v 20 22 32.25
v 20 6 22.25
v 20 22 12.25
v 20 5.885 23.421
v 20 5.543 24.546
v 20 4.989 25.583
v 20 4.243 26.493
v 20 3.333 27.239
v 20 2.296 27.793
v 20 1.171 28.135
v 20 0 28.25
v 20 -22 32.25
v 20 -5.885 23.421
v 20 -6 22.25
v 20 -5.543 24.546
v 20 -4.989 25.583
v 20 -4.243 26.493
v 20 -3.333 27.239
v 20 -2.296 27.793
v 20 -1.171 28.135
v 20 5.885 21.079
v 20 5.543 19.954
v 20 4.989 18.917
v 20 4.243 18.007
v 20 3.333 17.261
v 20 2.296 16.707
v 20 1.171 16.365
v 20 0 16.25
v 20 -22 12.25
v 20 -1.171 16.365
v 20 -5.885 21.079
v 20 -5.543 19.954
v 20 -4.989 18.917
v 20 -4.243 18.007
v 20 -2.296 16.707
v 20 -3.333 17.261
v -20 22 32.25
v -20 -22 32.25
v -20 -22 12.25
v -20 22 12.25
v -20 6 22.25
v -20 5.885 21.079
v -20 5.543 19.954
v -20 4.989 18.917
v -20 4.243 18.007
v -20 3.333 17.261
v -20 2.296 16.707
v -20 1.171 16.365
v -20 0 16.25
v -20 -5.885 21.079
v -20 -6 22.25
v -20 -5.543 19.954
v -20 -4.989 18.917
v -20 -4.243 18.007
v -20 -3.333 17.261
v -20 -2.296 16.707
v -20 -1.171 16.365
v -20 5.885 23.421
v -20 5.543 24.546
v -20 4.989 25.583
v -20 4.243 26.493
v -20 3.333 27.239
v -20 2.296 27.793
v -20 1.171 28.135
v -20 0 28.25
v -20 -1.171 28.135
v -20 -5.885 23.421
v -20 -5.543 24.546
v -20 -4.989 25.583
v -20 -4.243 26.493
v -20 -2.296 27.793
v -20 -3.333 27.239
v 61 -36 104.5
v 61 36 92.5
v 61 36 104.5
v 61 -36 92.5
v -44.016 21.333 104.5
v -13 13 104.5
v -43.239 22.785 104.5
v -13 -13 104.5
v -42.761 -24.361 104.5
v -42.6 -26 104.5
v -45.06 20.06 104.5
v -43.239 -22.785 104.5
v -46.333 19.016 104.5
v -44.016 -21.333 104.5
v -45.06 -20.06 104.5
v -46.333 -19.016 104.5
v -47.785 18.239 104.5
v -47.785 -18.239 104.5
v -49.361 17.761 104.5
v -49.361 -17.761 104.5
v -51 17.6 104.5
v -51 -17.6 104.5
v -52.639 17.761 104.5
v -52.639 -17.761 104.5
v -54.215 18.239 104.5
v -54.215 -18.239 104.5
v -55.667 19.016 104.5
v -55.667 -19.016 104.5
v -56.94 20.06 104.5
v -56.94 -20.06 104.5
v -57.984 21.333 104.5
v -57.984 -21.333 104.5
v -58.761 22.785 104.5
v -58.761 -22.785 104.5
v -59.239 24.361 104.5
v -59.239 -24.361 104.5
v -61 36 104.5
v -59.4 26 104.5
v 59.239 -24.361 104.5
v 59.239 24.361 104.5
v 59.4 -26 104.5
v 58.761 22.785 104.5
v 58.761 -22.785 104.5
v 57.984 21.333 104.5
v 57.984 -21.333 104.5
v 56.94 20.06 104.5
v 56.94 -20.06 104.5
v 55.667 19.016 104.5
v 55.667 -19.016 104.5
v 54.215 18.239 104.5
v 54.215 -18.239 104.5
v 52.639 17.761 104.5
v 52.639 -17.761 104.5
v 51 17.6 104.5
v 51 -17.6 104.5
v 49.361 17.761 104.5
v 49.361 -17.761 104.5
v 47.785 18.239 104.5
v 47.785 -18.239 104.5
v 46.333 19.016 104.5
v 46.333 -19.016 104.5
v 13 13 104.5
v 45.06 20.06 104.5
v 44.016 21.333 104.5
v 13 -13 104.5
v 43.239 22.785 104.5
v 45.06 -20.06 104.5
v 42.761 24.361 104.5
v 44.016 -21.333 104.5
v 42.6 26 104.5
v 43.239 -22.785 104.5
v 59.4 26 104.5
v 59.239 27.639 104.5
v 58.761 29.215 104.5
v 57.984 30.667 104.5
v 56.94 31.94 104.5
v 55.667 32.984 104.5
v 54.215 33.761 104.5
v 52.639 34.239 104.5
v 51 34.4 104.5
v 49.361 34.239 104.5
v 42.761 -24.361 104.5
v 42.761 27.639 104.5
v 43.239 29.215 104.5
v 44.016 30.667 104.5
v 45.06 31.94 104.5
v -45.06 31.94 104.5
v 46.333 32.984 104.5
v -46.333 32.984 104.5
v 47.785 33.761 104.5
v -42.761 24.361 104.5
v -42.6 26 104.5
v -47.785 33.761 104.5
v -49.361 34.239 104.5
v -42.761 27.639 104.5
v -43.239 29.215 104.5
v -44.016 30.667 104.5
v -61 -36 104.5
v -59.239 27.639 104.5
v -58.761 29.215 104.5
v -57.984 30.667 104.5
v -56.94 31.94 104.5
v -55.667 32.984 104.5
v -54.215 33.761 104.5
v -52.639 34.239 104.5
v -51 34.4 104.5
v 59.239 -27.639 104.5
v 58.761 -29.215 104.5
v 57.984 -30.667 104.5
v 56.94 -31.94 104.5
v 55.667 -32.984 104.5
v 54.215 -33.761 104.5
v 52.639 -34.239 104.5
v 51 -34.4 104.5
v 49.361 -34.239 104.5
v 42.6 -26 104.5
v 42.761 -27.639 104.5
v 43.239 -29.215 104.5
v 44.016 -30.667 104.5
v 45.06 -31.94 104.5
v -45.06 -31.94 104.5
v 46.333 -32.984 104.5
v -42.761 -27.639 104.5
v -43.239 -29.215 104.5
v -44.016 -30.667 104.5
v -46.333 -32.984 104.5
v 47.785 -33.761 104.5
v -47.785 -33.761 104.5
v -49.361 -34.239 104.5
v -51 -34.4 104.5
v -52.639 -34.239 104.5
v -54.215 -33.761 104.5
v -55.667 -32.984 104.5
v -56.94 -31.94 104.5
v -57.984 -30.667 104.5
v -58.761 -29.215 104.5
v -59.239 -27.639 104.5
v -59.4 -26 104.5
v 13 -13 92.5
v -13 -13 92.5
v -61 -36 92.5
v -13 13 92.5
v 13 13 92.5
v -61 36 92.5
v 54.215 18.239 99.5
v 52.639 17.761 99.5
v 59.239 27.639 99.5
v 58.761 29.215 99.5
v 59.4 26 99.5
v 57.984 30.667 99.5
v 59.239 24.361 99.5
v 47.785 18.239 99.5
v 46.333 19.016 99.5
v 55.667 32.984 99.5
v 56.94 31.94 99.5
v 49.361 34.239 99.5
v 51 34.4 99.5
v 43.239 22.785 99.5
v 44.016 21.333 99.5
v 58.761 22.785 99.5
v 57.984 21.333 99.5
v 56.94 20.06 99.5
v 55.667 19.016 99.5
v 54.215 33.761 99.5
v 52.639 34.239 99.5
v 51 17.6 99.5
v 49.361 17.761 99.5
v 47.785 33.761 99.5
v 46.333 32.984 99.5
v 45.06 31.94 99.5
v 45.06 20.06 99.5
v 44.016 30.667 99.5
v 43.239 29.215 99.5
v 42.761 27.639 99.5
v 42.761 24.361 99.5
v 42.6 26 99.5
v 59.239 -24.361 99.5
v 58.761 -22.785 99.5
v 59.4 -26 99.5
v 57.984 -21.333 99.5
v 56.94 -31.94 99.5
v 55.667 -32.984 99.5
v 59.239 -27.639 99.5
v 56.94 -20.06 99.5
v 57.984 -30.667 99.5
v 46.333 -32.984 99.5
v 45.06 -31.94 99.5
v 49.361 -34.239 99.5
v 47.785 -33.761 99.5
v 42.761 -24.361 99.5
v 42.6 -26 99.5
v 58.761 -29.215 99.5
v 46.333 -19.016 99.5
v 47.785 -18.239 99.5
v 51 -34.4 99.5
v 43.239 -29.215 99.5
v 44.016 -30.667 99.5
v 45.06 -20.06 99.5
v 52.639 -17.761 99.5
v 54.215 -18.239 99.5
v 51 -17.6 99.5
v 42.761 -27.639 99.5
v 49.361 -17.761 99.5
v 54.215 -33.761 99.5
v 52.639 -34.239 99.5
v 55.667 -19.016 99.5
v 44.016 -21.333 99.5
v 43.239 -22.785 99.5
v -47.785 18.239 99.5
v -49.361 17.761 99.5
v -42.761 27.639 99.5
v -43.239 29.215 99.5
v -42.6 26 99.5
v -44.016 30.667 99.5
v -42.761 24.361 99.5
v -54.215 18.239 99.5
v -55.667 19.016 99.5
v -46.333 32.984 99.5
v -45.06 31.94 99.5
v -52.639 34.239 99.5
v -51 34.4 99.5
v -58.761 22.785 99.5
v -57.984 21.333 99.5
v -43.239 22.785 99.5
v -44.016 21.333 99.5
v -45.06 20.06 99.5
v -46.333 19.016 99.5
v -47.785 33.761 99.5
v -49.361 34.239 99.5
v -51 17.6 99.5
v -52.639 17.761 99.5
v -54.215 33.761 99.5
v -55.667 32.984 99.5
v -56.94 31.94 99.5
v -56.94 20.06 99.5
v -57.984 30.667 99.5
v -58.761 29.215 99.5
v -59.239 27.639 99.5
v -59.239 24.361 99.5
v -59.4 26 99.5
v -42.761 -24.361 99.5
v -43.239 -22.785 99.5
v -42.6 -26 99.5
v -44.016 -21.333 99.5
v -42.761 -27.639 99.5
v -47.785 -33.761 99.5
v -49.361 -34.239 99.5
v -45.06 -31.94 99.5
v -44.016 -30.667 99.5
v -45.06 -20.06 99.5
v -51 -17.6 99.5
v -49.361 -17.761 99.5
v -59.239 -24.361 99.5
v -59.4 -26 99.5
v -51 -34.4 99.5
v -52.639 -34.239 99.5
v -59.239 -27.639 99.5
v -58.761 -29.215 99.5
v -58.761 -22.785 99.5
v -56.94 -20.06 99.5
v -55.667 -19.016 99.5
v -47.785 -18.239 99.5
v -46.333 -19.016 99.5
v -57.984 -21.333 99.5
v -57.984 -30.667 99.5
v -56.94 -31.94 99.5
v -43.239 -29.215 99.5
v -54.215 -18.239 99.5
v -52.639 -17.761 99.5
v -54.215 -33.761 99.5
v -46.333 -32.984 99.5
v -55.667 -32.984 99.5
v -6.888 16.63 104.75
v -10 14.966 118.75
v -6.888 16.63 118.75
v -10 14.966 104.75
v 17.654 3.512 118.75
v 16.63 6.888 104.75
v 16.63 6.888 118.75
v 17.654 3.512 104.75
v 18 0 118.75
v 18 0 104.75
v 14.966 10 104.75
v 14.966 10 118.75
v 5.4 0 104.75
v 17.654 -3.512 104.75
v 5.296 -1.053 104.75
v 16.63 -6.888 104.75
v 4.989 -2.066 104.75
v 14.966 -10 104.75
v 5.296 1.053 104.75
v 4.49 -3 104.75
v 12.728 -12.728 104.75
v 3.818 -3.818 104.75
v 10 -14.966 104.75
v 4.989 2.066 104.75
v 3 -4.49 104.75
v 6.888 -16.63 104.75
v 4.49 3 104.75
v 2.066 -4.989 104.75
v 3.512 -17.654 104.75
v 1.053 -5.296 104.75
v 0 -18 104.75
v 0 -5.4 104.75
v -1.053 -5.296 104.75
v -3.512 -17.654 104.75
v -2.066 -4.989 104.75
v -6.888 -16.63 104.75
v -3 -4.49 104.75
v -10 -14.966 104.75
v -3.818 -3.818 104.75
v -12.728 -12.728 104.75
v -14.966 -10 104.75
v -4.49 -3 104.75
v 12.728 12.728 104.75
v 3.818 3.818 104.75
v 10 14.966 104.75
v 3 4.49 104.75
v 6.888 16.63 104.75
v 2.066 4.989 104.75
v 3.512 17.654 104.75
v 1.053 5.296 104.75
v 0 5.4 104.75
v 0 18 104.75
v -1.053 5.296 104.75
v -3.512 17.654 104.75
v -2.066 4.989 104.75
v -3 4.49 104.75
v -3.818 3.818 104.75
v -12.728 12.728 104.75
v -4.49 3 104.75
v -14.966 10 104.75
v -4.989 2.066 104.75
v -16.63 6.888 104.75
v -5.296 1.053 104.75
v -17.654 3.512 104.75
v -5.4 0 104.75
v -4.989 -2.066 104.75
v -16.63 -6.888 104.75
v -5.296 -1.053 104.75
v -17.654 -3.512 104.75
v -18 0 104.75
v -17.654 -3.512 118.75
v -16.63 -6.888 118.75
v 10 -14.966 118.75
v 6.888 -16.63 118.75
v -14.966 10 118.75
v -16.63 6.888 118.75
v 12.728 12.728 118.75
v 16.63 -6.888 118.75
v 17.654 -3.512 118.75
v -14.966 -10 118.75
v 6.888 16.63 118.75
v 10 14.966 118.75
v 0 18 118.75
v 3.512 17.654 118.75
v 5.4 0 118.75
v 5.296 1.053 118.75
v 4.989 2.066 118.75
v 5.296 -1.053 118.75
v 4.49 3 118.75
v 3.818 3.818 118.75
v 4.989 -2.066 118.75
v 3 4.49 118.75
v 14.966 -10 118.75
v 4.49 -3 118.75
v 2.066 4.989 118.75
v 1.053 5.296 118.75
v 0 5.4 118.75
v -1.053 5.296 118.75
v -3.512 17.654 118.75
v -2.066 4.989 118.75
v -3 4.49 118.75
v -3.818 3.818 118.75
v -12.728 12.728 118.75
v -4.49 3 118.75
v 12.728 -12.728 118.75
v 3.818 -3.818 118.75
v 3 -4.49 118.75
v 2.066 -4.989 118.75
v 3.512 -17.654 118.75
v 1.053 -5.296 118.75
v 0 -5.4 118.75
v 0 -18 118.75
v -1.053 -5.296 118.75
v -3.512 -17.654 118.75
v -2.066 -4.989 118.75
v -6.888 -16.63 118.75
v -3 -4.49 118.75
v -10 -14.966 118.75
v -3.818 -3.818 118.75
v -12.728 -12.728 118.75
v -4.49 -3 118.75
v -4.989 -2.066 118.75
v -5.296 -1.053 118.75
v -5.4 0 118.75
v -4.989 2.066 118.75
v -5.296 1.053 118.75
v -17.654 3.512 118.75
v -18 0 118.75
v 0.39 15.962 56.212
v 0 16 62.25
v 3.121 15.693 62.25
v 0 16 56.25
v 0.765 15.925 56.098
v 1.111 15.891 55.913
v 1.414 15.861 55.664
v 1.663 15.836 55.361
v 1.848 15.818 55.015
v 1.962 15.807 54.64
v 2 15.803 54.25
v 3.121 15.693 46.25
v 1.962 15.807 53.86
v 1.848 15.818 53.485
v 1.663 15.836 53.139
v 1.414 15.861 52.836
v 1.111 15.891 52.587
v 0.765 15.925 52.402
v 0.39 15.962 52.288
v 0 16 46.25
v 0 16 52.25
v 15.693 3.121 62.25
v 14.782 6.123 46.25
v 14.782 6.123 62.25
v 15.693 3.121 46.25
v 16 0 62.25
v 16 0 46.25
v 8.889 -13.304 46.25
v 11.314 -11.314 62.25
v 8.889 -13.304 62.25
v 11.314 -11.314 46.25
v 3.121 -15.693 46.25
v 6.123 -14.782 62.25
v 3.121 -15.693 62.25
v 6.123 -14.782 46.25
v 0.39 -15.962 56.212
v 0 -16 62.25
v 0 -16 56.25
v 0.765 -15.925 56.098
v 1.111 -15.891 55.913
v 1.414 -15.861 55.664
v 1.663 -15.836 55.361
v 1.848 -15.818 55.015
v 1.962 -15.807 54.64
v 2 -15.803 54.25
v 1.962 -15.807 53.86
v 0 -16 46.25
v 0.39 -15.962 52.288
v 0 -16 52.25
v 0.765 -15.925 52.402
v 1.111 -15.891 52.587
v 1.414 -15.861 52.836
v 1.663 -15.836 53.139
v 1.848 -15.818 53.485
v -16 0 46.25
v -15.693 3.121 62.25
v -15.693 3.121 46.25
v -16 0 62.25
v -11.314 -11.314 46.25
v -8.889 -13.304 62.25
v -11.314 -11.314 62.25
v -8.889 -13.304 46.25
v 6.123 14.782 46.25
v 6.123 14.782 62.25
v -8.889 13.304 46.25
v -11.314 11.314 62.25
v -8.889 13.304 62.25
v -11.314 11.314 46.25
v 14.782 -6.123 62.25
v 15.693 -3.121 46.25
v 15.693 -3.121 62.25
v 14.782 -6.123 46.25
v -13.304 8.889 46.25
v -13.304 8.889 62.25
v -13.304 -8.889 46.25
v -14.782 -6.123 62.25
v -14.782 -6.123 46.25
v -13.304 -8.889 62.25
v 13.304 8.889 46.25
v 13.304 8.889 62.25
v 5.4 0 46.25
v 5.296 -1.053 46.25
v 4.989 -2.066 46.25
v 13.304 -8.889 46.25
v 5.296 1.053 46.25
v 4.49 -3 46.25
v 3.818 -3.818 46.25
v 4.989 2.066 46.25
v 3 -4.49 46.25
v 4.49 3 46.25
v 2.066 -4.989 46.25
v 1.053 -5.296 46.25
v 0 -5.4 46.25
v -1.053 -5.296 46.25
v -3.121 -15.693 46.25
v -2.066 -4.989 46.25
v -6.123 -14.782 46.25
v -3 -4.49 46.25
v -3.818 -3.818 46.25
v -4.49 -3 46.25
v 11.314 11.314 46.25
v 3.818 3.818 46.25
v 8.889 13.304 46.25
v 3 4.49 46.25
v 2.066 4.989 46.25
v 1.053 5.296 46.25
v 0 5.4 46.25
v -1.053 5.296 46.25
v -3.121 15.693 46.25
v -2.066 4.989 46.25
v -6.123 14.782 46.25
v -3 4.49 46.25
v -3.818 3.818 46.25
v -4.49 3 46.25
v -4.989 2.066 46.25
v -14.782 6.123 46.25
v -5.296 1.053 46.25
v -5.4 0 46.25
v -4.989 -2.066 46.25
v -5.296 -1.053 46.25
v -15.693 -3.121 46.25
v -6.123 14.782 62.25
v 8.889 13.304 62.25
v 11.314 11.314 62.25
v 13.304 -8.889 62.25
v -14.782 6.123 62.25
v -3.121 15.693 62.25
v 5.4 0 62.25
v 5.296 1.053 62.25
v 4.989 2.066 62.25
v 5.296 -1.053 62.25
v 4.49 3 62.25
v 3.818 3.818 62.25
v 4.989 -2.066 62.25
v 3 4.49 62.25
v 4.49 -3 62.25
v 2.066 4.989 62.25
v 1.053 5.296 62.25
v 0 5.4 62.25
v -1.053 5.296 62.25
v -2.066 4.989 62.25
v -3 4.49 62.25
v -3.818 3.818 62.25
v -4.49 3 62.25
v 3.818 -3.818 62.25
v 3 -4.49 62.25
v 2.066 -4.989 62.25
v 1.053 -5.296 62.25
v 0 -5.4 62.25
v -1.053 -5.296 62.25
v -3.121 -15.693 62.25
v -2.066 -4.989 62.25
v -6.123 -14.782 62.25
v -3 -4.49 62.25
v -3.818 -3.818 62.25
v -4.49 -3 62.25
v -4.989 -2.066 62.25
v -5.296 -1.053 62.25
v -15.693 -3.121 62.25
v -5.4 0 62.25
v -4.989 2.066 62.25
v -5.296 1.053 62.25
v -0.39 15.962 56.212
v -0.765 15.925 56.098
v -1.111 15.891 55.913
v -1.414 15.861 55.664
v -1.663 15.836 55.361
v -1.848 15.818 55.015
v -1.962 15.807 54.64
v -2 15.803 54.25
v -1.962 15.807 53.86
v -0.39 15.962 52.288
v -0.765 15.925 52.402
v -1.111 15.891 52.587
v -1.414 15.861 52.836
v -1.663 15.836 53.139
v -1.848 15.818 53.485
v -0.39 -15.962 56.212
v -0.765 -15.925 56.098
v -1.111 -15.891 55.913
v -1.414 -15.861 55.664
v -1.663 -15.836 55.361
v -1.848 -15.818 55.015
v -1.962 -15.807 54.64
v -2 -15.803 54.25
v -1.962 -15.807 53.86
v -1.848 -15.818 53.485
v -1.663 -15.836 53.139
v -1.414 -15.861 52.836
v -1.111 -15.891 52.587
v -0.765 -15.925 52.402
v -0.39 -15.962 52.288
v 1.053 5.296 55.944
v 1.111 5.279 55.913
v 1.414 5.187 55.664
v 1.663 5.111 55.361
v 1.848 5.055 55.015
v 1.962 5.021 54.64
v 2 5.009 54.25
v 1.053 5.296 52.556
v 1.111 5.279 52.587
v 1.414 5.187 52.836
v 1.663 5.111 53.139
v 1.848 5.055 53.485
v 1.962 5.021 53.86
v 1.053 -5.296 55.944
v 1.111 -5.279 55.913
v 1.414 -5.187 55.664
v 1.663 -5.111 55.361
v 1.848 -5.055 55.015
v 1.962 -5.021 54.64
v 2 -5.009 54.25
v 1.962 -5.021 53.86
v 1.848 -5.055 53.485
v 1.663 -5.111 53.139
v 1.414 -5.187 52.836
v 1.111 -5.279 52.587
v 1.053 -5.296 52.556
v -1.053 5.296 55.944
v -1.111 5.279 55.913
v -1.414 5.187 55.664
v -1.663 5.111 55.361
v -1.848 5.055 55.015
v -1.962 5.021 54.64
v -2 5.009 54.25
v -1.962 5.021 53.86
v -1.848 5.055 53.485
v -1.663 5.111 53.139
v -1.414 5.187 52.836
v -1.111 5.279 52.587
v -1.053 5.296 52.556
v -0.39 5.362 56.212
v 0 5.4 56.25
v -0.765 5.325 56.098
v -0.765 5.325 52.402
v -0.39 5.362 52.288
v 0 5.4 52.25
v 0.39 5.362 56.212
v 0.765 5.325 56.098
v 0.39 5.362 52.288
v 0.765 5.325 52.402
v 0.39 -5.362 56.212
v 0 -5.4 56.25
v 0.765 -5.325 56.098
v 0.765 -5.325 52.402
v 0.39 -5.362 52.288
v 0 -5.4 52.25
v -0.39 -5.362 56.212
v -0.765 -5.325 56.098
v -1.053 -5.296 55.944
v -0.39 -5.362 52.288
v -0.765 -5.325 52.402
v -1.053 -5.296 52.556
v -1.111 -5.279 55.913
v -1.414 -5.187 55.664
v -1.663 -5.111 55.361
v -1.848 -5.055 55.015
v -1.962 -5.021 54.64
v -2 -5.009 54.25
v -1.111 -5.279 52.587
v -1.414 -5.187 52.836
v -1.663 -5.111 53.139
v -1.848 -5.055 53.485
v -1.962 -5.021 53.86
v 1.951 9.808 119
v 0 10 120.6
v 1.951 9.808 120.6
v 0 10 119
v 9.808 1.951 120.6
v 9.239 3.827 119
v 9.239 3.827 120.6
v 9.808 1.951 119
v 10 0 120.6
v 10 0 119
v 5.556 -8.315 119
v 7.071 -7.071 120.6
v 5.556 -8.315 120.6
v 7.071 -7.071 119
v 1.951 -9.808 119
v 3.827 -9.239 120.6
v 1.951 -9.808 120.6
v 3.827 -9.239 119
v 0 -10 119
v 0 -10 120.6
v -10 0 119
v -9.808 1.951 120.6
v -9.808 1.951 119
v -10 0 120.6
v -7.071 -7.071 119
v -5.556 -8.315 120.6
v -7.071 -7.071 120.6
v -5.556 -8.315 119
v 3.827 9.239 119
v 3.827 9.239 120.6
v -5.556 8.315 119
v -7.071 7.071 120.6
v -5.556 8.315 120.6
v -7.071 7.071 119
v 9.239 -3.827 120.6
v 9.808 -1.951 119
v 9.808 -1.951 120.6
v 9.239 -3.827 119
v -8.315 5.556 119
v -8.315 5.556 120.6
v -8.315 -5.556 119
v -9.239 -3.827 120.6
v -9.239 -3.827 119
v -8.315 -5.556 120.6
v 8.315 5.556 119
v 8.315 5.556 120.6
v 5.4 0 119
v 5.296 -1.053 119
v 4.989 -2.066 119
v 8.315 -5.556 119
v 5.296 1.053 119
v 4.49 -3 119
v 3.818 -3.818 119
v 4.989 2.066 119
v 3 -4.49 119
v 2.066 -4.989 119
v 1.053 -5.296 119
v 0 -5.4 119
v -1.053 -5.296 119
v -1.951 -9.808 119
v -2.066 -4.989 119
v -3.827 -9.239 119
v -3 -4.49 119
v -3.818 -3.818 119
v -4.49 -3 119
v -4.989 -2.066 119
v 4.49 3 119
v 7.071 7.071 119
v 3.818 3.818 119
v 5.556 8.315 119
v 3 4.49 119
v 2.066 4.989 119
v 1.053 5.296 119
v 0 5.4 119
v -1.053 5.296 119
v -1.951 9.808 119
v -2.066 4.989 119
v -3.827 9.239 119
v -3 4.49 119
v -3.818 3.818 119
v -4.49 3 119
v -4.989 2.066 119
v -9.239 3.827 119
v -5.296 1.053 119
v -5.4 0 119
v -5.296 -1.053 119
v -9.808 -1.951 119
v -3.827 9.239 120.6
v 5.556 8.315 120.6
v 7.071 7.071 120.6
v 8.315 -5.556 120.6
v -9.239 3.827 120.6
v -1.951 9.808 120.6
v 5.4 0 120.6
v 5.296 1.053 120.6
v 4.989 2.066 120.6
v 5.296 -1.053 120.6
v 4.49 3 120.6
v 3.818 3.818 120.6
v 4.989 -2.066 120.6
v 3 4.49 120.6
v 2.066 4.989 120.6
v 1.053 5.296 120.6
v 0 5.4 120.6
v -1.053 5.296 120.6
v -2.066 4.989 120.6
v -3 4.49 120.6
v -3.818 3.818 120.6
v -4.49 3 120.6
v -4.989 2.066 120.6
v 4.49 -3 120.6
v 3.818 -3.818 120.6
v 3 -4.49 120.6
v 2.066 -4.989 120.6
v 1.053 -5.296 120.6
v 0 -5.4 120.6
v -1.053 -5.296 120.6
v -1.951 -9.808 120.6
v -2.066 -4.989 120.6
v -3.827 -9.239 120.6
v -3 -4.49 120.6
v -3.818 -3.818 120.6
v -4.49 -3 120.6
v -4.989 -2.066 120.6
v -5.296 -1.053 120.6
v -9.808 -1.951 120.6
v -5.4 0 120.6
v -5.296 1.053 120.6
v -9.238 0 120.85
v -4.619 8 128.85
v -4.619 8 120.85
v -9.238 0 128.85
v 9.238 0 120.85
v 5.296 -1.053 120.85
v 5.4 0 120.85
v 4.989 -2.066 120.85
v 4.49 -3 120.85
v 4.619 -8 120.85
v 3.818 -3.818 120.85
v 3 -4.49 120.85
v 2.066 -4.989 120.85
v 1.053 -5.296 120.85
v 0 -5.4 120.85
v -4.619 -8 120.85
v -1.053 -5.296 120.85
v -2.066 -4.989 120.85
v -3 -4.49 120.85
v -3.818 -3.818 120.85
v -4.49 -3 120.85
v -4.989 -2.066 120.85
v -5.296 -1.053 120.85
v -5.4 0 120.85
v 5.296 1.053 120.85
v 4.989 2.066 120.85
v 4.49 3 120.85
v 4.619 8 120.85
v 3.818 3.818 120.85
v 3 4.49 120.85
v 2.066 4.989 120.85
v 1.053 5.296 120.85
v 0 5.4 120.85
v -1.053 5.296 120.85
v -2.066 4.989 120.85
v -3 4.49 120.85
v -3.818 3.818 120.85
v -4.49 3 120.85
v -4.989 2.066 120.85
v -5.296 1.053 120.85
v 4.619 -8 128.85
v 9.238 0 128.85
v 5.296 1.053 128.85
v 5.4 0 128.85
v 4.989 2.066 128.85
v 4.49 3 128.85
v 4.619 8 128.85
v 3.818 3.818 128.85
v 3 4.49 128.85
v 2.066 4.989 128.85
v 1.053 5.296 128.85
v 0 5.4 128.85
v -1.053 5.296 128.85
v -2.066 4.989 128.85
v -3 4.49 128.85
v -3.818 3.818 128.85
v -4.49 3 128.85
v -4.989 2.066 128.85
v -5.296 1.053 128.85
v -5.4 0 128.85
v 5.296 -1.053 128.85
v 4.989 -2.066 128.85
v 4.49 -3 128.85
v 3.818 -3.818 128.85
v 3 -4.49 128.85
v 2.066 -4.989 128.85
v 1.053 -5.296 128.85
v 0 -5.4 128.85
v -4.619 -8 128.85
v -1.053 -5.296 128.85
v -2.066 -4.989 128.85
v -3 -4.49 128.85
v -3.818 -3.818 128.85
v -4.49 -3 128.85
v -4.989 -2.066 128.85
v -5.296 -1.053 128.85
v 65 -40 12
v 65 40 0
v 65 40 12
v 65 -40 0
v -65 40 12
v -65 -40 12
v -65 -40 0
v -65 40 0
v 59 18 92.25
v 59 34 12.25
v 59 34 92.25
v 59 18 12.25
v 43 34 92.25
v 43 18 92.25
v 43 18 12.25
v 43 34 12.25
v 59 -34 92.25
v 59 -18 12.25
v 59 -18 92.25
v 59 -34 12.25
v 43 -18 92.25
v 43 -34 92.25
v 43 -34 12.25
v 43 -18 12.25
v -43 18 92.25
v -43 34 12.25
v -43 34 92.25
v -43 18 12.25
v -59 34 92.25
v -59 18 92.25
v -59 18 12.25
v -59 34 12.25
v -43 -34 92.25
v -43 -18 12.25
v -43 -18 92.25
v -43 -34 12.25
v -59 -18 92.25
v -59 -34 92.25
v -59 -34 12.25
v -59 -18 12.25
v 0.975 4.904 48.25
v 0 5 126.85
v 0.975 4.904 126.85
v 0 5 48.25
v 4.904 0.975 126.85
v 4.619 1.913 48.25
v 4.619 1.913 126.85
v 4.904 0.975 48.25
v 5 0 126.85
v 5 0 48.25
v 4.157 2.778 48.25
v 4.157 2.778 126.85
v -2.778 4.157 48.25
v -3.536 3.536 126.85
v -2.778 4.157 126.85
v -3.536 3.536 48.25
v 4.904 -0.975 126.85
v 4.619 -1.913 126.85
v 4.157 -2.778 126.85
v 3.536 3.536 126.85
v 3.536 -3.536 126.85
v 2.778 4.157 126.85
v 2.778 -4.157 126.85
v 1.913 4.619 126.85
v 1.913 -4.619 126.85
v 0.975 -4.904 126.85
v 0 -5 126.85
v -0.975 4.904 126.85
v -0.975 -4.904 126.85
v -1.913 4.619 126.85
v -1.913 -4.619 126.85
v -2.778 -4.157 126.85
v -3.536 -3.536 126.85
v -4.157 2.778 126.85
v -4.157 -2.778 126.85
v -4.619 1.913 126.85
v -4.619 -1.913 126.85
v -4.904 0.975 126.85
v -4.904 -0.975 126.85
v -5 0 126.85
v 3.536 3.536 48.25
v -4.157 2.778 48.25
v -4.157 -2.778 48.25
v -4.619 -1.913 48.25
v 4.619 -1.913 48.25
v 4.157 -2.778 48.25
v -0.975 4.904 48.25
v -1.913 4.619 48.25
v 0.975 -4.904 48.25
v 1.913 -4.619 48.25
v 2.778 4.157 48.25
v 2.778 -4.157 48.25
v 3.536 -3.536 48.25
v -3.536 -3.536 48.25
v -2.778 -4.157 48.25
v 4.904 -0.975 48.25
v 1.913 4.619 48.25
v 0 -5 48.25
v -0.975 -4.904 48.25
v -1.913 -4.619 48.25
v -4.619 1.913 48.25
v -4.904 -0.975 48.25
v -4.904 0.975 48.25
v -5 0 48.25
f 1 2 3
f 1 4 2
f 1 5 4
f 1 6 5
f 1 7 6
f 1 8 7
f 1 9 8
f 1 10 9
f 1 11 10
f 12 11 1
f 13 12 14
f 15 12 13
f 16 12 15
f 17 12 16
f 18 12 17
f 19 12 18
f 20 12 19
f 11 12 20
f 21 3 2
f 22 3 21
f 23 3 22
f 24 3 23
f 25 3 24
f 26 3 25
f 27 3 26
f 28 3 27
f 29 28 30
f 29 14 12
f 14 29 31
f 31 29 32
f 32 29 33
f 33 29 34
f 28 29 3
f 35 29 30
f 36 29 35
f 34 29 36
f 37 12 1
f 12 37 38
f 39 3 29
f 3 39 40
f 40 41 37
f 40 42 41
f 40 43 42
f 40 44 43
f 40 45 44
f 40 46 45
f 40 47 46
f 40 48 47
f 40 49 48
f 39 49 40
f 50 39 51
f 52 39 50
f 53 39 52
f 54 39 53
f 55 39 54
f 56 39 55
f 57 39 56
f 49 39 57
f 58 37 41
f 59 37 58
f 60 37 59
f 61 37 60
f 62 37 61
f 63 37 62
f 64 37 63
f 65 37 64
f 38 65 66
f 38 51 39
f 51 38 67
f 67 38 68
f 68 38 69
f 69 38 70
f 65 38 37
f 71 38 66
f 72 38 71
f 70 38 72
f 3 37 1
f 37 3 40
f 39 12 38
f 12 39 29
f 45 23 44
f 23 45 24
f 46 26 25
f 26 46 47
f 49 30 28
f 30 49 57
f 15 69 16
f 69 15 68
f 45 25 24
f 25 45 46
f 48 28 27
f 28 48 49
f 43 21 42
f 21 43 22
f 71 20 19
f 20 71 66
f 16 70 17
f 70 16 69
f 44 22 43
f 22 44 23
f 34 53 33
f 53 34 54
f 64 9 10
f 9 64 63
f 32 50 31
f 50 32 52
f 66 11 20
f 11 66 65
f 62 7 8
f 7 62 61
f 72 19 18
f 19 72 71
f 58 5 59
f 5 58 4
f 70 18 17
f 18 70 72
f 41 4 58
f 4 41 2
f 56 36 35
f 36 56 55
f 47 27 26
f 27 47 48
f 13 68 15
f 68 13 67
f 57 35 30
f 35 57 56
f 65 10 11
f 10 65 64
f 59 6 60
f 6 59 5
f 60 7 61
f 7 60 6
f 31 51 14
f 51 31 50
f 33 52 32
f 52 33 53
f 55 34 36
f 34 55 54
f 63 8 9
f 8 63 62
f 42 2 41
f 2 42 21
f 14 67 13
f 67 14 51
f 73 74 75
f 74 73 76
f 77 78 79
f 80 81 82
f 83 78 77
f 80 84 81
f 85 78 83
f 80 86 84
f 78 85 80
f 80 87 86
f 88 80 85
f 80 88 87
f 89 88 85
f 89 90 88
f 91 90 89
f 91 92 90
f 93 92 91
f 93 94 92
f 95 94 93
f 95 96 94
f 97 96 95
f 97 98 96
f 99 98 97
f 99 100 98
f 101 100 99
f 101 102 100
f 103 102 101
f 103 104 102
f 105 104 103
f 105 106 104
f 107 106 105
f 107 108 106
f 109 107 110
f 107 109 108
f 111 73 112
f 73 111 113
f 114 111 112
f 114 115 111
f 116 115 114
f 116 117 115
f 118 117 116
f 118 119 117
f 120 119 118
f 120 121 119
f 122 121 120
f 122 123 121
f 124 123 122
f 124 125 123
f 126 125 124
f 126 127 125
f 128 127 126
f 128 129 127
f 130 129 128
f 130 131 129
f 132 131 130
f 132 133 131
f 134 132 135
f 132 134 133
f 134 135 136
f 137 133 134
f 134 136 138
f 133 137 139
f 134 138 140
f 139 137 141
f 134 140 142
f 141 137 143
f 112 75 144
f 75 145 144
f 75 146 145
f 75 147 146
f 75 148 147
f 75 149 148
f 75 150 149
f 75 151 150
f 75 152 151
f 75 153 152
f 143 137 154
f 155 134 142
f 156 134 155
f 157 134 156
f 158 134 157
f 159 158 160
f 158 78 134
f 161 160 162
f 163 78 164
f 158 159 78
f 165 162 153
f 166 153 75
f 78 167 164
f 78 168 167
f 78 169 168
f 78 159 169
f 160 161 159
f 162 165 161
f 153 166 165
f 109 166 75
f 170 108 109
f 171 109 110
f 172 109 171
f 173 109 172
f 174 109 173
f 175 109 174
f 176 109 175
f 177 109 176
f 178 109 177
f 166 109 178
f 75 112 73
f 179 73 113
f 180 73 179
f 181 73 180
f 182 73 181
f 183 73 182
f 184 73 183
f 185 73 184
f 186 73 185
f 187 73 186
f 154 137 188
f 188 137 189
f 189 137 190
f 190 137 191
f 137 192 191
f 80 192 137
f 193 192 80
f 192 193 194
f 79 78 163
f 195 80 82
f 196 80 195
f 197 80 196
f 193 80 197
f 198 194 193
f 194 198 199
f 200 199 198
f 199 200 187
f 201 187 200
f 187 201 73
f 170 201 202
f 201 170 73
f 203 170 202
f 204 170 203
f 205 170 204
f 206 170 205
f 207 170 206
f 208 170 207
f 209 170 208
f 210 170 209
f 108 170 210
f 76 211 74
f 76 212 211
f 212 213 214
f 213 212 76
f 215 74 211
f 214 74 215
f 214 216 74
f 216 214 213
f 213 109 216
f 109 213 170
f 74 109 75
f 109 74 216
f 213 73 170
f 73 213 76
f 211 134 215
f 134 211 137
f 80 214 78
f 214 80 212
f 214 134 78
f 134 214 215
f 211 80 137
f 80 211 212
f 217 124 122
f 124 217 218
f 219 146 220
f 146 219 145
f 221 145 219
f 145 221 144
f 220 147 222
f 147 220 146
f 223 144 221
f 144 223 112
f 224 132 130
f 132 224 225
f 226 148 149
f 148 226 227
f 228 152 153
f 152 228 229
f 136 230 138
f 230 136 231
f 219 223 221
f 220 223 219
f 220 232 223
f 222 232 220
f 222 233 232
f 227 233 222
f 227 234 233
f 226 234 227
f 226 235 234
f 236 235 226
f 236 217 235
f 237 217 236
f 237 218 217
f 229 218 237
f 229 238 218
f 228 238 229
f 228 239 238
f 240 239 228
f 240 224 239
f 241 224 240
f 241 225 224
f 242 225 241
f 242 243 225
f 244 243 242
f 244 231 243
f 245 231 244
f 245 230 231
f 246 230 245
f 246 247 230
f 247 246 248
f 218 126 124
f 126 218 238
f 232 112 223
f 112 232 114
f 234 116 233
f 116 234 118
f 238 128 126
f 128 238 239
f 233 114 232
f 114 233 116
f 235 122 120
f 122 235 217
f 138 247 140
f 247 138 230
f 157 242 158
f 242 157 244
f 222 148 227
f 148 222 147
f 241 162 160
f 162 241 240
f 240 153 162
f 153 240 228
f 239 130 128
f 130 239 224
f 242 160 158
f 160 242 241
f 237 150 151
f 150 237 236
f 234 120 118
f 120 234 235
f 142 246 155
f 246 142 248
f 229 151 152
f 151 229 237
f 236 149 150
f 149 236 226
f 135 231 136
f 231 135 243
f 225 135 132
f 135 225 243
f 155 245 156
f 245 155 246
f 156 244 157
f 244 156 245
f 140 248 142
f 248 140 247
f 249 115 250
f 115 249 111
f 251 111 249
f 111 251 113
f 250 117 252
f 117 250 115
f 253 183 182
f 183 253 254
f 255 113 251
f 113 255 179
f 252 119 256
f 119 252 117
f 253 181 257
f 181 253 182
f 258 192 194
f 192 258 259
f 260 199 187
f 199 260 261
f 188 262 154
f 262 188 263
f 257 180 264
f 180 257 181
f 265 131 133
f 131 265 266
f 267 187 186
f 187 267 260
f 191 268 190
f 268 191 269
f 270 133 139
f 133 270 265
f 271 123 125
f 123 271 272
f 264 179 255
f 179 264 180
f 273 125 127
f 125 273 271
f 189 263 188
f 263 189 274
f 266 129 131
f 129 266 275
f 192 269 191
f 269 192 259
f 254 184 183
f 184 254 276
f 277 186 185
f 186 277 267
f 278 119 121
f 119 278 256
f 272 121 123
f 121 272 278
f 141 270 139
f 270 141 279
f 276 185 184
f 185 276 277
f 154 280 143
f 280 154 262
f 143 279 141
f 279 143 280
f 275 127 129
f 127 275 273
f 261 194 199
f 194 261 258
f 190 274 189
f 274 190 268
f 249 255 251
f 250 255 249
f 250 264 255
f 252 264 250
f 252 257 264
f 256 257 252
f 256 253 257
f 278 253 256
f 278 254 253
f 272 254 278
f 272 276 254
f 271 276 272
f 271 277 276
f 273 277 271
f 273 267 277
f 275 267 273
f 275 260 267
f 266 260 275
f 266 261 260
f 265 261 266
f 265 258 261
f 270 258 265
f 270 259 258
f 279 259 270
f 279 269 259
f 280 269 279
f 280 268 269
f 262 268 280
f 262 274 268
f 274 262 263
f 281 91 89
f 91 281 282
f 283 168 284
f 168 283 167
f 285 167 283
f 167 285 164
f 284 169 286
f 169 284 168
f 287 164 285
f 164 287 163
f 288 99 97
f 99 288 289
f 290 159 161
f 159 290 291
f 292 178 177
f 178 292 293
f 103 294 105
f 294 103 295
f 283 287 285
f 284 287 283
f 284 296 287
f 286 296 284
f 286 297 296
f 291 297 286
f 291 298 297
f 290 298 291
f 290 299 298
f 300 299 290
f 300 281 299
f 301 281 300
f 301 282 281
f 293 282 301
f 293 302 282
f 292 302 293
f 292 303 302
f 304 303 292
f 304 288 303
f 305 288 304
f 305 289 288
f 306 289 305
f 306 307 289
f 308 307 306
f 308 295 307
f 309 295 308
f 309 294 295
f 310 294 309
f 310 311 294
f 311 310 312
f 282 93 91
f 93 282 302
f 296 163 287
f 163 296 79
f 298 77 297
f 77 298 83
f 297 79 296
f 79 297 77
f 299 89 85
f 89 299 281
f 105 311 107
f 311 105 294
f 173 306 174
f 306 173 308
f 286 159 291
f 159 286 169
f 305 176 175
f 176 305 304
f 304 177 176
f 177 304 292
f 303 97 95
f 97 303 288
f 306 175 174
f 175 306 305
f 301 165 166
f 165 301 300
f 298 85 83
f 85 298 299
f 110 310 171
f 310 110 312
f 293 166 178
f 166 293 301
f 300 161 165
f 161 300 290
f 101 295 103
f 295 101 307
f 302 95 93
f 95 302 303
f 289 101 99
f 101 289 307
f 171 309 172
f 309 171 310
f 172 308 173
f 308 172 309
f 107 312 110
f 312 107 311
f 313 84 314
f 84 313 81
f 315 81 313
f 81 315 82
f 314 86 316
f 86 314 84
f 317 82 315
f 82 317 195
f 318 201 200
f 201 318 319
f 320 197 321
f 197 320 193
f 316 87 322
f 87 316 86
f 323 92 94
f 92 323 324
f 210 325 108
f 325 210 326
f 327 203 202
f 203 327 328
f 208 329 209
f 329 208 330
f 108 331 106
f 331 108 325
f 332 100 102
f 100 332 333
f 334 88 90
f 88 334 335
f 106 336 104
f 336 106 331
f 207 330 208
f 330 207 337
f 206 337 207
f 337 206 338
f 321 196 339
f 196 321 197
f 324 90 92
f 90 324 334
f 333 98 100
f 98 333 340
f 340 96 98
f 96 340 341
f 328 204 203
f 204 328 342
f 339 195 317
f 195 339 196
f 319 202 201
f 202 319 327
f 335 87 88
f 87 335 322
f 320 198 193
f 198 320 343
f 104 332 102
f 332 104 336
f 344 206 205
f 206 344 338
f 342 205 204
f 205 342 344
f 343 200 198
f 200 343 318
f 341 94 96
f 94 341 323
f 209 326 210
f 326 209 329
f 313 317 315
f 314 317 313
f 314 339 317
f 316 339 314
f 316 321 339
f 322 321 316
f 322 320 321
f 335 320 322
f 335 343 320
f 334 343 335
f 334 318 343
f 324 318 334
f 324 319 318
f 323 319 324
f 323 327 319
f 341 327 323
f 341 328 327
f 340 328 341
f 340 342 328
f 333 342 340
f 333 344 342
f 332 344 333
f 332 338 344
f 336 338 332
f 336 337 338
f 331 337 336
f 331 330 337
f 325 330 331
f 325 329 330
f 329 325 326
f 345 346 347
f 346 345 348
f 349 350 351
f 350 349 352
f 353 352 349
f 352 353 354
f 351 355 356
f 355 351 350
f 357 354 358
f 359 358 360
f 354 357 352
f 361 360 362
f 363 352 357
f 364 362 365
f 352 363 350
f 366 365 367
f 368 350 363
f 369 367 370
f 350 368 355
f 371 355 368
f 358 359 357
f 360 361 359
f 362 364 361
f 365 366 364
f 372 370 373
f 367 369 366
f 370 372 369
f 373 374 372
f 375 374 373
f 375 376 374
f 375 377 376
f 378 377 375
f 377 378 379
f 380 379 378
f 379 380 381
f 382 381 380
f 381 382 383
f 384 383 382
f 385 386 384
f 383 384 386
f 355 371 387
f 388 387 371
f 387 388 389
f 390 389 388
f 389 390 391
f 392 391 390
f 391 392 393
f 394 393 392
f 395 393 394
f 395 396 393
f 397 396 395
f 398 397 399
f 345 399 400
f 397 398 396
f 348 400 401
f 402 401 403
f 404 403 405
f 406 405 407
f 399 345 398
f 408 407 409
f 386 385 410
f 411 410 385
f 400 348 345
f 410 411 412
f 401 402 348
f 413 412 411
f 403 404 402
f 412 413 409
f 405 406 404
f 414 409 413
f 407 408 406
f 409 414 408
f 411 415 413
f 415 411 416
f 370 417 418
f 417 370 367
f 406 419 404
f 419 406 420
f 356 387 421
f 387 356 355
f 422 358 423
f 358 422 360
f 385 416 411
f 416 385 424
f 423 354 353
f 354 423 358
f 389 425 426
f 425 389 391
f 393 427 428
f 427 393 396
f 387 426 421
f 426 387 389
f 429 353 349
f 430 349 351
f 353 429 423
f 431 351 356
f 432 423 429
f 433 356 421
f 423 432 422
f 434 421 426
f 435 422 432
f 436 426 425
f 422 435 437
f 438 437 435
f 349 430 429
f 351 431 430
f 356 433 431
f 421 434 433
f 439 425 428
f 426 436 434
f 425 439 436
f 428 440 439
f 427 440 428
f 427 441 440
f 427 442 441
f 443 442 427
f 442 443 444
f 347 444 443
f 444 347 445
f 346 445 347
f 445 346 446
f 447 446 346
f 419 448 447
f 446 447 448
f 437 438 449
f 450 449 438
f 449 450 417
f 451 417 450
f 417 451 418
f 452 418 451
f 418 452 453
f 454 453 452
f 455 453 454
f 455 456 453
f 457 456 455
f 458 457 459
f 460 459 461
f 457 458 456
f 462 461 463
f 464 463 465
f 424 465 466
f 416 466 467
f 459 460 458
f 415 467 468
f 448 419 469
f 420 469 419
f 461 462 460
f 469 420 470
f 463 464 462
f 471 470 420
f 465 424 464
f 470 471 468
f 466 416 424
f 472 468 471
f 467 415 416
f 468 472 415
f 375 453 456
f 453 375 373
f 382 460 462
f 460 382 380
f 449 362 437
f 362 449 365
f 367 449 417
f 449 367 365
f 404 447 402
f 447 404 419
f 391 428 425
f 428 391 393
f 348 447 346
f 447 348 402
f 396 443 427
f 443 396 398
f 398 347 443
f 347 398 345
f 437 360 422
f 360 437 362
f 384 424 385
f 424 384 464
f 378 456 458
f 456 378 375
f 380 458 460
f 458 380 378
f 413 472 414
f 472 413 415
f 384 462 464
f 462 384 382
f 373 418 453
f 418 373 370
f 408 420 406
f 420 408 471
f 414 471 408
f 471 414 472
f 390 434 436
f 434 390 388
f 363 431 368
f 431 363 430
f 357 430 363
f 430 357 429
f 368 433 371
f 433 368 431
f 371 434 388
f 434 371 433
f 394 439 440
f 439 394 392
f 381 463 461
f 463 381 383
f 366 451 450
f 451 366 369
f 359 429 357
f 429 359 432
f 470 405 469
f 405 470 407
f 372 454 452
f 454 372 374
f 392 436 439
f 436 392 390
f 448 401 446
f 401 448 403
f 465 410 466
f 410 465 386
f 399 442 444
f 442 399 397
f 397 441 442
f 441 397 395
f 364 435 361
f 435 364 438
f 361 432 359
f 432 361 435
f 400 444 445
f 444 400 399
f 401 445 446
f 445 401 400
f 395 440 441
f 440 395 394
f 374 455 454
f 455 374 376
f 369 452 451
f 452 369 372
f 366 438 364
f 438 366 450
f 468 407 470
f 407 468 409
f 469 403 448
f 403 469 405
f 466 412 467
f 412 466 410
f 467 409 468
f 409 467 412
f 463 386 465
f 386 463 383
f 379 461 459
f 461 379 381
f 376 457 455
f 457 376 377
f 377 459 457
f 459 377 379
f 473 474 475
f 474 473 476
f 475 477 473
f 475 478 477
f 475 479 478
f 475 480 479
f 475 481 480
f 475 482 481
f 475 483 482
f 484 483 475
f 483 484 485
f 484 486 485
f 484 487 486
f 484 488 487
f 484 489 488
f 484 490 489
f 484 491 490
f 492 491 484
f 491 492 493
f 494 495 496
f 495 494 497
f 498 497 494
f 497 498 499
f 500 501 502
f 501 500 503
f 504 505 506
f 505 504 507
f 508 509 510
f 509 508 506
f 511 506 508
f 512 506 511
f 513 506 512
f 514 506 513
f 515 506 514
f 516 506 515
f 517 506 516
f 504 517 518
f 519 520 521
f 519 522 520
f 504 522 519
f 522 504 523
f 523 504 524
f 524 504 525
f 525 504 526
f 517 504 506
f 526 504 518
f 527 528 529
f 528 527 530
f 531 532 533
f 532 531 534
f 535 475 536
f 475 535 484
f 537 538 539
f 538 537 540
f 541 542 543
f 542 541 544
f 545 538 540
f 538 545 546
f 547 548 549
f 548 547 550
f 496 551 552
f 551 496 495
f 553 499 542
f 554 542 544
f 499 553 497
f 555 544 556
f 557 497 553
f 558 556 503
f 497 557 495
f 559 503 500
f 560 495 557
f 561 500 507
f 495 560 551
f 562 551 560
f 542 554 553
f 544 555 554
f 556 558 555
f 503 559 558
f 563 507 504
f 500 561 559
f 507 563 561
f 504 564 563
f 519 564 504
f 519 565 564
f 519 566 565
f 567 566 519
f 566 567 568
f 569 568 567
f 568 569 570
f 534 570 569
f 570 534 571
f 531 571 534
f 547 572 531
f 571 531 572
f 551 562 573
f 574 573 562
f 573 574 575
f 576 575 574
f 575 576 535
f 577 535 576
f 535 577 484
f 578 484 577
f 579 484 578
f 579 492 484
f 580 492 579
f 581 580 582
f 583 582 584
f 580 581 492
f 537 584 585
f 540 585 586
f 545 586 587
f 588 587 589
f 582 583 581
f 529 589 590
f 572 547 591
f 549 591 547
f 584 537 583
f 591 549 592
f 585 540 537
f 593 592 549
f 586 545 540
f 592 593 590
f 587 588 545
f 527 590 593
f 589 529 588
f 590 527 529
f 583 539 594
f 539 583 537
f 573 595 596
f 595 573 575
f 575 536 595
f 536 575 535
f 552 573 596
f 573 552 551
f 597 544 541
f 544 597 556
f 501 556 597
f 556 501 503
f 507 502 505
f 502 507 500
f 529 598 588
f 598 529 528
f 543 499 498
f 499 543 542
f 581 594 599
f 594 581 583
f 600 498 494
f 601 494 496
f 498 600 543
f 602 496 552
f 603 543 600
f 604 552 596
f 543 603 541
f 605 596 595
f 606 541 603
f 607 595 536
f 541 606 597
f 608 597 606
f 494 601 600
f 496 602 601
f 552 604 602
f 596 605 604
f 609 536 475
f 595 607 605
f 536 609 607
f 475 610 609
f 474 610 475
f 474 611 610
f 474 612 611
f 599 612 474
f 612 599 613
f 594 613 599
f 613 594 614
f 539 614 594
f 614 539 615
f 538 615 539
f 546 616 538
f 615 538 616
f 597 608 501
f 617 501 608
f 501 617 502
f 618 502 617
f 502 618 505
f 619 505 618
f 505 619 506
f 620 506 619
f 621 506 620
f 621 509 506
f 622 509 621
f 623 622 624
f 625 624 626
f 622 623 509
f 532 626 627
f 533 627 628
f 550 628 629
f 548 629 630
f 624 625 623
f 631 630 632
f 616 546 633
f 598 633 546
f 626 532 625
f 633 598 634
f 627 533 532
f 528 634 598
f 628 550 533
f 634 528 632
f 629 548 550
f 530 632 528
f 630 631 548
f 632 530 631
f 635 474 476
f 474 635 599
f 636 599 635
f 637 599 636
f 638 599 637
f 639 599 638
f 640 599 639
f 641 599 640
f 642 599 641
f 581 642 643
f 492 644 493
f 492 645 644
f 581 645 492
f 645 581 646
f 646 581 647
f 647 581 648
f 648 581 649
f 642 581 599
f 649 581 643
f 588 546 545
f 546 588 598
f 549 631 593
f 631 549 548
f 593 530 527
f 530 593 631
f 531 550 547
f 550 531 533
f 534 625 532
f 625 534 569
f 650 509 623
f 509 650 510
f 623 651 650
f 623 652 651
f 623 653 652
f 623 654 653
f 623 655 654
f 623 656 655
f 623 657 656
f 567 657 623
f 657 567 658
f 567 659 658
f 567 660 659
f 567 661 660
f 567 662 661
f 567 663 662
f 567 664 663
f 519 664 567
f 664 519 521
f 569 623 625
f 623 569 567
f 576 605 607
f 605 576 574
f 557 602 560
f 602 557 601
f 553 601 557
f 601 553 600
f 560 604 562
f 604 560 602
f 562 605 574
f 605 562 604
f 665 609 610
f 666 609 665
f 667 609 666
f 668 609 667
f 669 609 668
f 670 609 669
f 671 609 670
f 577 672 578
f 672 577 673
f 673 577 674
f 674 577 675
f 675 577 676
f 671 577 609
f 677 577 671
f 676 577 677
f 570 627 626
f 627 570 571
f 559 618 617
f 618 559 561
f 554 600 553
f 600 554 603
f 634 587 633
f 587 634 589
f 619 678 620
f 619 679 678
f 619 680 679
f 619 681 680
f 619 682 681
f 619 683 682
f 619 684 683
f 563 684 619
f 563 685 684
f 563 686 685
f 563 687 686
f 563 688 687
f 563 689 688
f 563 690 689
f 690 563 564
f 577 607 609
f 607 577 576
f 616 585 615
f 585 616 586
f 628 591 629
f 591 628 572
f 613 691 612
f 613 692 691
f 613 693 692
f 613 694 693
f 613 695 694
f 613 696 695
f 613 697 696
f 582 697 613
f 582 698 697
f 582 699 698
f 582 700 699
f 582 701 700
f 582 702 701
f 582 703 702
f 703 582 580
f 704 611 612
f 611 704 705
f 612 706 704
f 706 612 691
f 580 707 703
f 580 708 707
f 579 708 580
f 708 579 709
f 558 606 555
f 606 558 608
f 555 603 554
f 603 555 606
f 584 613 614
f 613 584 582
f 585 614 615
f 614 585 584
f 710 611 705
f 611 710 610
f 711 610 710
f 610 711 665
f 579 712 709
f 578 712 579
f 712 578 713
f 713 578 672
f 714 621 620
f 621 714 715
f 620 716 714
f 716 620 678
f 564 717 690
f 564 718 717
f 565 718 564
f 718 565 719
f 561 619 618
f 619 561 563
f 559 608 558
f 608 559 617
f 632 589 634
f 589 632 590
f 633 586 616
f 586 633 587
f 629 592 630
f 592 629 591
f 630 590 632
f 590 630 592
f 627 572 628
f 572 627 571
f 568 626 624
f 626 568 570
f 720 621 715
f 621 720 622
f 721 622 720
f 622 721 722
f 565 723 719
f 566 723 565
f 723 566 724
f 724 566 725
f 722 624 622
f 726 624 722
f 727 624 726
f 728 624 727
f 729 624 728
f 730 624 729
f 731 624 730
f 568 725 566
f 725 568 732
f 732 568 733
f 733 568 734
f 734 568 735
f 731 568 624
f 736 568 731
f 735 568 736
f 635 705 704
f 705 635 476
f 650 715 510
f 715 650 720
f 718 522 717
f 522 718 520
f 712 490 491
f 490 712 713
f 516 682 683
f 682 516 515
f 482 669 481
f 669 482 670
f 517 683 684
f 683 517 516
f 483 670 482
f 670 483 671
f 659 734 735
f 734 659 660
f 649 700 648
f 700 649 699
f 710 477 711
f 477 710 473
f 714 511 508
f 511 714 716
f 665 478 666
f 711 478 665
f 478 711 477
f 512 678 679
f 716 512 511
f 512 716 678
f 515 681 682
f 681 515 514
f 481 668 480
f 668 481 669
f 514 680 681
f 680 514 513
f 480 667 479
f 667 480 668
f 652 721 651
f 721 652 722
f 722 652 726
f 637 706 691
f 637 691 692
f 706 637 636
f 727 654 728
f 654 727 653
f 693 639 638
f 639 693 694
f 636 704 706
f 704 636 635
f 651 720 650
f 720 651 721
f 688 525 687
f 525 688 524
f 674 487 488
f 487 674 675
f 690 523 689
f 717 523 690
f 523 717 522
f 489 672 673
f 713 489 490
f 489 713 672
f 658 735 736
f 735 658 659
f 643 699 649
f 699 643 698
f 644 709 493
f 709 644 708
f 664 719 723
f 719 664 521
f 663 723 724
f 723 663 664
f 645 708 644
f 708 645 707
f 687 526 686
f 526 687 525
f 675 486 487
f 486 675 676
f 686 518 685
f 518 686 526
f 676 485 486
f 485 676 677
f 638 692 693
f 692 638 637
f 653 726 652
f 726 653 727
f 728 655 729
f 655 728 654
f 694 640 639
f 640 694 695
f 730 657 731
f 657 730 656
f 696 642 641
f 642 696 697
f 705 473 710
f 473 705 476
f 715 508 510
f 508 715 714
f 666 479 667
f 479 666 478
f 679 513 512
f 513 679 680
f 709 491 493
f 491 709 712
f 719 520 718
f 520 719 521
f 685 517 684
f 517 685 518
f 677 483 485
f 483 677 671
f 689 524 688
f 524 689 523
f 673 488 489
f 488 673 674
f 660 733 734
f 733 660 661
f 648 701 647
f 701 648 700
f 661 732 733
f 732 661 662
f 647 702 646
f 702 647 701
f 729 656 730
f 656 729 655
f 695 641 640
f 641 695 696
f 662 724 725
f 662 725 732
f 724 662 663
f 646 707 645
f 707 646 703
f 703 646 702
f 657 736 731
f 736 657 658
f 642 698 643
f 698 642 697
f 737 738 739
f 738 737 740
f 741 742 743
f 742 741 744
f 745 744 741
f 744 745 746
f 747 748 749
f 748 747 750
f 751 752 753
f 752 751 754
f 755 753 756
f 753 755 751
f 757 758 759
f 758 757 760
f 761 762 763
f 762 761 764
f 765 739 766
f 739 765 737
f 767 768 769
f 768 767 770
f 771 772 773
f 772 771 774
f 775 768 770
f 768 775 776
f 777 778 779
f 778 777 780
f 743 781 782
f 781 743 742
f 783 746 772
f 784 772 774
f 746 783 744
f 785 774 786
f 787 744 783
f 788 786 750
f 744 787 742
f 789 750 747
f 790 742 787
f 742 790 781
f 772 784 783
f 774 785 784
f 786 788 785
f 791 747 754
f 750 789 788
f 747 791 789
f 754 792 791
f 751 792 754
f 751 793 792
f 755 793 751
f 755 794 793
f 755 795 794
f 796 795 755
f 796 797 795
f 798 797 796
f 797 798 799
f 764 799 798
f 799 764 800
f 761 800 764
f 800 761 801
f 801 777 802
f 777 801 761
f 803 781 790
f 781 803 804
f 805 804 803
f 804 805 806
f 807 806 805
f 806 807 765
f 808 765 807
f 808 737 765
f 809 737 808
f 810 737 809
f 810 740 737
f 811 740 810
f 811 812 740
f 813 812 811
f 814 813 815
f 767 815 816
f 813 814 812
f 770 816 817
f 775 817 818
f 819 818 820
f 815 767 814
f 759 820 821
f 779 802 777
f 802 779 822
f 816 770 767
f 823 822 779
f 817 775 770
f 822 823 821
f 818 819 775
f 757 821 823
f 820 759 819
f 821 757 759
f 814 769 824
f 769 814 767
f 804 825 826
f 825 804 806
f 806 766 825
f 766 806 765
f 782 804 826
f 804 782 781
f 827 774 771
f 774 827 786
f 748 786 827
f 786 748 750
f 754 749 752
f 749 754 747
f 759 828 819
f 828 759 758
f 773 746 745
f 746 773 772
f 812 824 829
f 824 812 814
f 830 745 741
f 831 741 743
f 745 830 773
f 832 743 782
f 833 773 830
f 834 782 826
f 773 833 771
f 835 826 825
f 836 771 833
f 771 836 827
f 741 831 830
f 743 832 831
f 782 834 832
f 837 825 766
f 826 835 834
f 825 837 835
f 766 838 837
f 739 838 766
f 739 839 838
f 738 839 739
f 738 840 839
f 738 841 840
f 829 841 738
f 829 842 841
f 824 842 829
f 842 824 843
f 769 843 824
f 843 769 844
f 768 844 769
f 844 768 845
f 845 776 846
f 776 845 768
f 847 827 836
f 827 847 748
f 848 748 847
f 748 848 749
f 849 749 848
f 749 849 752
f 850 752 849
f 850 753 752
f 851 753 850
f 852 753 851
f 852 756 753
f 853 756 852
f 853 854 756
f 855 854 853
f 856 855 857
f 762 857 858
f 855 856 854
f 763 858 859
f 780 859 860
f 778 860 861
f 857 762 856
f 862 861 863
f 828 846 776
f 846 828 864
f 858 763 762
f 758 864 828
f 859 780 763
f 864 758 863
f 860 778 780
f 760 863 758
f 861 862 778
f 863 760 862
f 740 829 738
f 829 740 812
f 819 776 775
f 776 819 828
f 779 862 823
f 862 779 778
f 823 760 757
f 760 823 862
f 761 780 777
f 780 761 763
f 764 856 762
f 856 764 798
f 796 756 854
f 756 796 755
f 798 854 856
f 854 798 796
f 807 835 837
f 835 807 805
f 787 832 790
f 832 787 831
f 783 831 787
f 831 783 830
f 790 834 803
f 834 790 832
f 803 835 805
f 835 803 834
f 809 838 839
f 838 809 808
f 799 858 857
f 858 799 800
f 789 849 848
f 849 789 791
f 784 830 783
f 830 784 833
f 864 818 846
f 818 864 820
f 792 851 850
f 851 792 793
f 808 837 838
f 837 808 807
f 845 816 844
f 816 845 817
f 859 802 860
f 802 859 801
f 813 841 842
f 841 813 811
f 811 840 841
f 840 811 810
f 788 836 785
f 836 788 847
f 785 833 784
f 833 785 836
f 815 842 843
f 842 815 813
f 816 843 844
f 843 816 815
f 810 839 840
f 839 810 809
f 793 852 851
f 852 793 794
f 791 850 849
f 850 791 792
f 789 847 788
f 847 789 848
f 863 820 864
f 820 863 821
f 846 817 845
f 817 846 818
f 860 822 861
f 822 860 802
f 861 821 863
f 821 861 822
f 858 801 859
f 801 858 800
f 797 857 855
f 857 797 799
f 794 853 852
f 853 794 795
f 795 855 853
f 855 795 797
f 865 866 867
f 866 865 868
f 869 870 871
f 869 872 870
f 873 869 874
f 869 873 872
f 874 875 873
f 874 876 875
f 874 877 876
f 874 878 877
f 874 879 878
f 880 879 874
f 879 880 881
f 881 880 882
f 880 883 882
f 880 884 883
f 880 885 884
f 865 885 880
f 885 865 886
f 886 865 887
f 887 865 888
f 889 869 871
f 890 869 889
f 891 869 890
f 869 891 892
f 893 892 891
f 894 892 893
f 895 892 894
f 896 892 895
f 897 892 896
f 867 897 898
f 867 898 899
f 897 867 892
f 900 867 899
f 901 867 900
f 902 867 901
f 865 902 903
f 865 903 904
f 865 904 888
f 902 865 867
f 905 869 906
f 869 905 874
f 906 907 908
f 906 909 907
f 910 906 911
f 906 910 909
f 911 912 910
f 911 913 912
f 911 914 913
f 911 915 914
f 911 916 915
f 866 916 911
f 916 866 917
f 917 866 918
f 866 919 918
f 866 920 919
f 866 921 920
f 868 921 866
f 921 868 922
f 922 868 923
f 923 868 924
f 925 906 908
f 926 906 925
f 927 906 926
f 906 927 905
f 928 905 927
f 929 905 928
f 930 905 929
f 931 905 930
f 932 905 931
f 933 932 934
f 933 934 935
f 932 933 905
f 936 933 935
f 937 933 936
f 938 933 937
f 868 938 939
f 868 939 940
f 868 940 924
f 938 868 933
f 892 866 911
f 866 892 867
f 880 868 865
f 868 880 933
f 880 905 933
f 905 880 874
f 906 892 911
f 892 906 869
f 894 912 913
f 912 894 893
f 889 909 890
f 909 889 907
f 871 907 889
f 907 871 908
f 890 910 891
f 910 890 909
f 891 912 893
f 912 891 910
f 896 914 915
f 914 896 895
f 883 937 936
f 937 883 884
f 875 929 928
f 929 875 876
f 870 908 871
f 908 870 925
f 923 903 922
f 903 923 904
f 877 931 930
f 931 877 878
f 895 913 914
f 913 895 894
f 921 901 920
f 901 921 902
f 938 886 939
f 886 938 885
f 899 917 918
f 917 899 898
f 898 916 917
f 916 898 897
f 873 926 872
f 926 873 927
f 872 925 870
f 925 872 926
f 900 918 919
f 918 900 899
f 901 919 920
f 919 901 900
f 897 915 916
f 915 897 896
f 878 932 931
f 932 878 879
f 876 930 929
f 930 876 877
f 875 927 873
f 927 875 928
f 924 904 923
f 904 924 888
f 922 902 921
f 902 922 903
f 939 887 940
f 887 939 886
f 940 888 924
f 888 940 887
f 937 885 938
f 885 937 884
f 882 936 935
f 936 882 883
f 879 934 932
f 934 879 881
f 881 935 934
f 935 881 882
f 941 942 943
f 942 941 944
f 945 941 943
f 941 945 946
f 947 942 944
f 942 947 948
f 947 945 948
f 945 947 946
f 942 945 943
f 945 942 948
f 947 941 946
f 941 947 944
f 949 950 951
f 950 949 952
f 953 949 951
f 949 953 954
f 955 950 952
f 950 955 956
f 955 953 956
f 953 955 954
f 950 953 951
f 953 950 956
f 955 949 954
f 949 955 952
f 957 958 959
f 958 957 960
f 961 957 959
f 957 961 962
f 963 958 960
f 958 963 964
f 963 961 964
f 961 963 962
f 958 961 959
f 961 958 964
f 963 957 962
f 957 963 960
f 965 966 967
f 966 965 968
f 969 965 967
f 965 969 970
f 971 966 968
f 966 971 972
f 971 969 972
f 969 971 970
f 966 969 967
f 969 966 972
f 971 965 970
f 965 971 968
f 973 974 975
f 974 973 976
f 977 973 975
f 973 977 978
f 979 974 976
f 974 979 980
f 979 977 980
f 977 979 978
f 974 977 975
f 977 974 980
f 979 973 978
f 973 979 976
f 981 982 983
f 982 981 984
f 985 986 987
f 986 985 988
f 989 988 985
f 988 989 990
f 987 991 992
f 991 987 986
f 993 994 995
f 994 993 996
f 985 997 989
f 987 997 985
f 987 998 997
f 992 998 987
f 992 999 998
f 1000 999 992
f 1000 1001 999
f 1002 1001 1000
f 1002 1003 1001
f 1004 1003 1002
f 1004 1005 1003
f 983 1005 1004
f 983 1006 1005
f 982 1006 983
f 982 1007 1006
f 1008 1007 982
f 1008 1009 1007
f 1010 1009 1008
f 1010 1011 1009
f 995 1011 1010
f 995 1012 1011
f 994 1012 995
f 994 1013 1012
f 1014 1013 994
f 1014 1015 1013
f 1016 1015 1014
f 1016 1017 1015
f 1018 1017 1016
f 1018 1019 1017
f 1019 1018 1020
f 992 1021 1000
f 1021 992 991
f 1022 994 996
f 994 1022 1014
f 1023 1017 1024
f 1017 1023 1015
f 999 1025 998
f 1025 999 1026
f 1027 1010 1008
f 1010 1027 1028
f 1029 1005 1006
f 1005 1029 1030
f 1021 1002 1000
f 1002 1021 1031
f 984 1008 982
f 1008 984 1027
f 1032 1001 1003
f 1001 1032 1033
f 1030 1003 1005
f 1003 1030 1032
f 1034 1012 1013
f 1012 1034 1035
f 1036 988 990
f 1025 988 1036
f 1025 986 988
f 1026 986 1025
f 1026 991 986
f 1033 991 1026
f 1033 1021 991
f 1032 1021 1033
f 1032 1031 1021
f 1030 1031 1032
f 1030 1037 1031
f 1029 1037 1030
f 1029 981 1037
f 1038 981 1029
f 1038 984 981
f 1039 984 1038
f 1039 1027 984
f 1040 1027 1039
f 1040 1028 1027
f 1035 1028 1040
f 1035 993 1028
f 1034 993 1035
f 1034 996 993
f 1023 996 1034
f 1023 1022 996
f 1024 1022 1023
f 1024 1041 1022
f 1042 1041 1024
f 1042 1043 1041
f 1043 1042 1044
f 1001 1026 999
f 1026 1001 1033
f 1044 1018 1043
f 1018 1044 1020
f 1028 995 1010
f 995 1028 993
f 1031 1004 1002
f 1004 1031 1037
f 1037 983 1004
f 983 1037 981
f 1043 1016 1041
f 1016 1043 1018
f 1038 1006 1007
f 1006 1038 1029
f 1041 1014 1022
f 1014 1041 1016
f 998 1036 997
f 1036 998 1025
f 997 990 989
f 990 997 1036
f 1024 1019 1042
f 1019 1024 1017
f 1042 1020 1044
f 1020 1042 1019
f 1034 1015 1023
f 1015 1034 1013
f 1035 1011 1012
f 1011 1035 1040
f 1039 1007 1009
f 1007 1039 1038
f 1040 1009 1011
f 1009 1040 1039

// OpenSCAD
$fn = 32;

// ------------------------------------------------------------------------
// Arbor press fixture: screw d10, posts 80 mm, gap 14 mm
// Every part is its own module, assembly() places every instance.
// ------------------------------------------------------------------------

// --- part 1 ---
module press_bed() {
  difference() {
    translate([-65, -40, 0]) cube([130, 80, 12]);
  }
}

// --- part 2 ---
module anvil_block() {
  difference() {
    translate([-20, -22, 0]) cube([40, 44, 20]);
    translate([0, 0, 10]) rotate([0, 90, 0]) cylinder(h = 42, d = 12, center = true);
  }
}

// --- part 3 ---
module press_post_a() {
  translate([-8, -8, 0]) cube([16, 16, 80]);
}

// --- part 4 ---
module press_post_b() {
  translate([-8, -8, 0]) cube([16, 16, 80]);
}

// --- part 5 ---
module press_post_c() {
  translate([-8, -8, 0]) cube([16, 16, 80]);
}

// --- part 6 ---
module press_post_d() {
  translate([-8, -8, 0]) cube([16, 16, 80]);
}

// --- part 7 ---
module press_frame() {
  difference() {
    translate([-61, -36, 0]) cube([122, 72, 12]);
    translate([-13, -13, -1]) cube([26, 26, 14]);
    translate([51, 26, 7]) cylinder(h = 6, d = 16.8);
    translate([51, -26, 7]) cylinder(h = 6, d = 16.8);
    translate([-51, 26, 7]) cylinder(h = 6, d = 16.8);
    translate([-51, -26, 7]) cylinder(h = 6, d = 16.8);
  }
}

// --- part 8 ---
module guide_ring() {
  difference() {
      translate([0, 0, 0]) cylinder(h = 14, d = 36);
      translate([0, 0, -1]) cylinder(h = 16, d = 10.8);
    }
}

// --- part 9 ---
module press_screw() {
  translate([0, 0, -39.3]) cylinder(h = 78.6, d = 10);
}

// --- part 10 ---
module press_head() {
  difference() {
    cylinder(h = 16, d = 32);
    translate([0, 0, -1]) cylinder(h = 18, d = 10.8);
    translate([0, 0, 8]) rotate([90, 0, 0]) cylinder(h = 34, d = 4, center = true);
  }
}

// --- part 11 ---
module nut_washer() {
  difference() {
      translate([0, 0, 0]) cylinder(h = 1.6, d = 20);
      translate([0, 0, -1]) cylinder(h = 3.6, d = 10.8);
    }
}

// --- part 12 ---
module press_nut() {
  difference() {
    linear_extrude(height = 8) polygon(points = [[9.238, 0], [4.619, 8], [-4.619, 8], [-9.238, 0], [-4.619, -8], [4.619, -8]]);
    translate([0, 0, -1]) cylinder(h = 10, d = 10.8);
  }
}

// --- assembly ---
module assembly() {
  color([0.80, 0.24, 0.20]) translate([0, 0, 0]) rotate([0, 0, 0]) press_bed();
  color([0.20, 0.45, 0.75]) translate([0, 0, 12.25]) rotate([0, 0, 0]) anvil_block();
  color([0.25, 0.62, 0.32]) translate([51, 26, 12.25]) rotate([0, 0, 0]) press_post_a();
  color([0.92, 0.70, 0.18]) translate([51, -26, 12.25]) rotate([0, 0, 0]) press_post_b();
  color([0.58, 0.35, 0.70]) translate([-51, 26, 12.25]) rotate([0, 0, 0]) press_post_c();
  color([0.16, 0.66, 0.66]) translate([-51, -26, 12.25]) rotate([0, 0, 0]) press_post_d();
  color([0.85, 0.48, 0.18]) translate([0, 0, 92.5]) rotate([0, 0, 0]) press_frame();
  color([0.55, 0.60, 0.65]) translate([0, 0, 104.75]) rotate([0, 0, 0]) guide_ring();
  color([0.75, 0.30, 0.55]) translate([0, 0, 87.55]) rotate([0, 0, 0]) press_screw();
  color([0.42, 0.52, 0.28]) translate([0, 0, 46.25]) rotate([0, 0, 0]) press_head();
  color([0.80, 0.24, 0.20]) translate([0, 0, 119]) rotate([0, 0, 0]) nut_washer();
  color([0.20, 0.45, 0.75]) translate([0, 0, 120.85]) rotate([0, 0, 0]) press_nut();
}

assembly();
